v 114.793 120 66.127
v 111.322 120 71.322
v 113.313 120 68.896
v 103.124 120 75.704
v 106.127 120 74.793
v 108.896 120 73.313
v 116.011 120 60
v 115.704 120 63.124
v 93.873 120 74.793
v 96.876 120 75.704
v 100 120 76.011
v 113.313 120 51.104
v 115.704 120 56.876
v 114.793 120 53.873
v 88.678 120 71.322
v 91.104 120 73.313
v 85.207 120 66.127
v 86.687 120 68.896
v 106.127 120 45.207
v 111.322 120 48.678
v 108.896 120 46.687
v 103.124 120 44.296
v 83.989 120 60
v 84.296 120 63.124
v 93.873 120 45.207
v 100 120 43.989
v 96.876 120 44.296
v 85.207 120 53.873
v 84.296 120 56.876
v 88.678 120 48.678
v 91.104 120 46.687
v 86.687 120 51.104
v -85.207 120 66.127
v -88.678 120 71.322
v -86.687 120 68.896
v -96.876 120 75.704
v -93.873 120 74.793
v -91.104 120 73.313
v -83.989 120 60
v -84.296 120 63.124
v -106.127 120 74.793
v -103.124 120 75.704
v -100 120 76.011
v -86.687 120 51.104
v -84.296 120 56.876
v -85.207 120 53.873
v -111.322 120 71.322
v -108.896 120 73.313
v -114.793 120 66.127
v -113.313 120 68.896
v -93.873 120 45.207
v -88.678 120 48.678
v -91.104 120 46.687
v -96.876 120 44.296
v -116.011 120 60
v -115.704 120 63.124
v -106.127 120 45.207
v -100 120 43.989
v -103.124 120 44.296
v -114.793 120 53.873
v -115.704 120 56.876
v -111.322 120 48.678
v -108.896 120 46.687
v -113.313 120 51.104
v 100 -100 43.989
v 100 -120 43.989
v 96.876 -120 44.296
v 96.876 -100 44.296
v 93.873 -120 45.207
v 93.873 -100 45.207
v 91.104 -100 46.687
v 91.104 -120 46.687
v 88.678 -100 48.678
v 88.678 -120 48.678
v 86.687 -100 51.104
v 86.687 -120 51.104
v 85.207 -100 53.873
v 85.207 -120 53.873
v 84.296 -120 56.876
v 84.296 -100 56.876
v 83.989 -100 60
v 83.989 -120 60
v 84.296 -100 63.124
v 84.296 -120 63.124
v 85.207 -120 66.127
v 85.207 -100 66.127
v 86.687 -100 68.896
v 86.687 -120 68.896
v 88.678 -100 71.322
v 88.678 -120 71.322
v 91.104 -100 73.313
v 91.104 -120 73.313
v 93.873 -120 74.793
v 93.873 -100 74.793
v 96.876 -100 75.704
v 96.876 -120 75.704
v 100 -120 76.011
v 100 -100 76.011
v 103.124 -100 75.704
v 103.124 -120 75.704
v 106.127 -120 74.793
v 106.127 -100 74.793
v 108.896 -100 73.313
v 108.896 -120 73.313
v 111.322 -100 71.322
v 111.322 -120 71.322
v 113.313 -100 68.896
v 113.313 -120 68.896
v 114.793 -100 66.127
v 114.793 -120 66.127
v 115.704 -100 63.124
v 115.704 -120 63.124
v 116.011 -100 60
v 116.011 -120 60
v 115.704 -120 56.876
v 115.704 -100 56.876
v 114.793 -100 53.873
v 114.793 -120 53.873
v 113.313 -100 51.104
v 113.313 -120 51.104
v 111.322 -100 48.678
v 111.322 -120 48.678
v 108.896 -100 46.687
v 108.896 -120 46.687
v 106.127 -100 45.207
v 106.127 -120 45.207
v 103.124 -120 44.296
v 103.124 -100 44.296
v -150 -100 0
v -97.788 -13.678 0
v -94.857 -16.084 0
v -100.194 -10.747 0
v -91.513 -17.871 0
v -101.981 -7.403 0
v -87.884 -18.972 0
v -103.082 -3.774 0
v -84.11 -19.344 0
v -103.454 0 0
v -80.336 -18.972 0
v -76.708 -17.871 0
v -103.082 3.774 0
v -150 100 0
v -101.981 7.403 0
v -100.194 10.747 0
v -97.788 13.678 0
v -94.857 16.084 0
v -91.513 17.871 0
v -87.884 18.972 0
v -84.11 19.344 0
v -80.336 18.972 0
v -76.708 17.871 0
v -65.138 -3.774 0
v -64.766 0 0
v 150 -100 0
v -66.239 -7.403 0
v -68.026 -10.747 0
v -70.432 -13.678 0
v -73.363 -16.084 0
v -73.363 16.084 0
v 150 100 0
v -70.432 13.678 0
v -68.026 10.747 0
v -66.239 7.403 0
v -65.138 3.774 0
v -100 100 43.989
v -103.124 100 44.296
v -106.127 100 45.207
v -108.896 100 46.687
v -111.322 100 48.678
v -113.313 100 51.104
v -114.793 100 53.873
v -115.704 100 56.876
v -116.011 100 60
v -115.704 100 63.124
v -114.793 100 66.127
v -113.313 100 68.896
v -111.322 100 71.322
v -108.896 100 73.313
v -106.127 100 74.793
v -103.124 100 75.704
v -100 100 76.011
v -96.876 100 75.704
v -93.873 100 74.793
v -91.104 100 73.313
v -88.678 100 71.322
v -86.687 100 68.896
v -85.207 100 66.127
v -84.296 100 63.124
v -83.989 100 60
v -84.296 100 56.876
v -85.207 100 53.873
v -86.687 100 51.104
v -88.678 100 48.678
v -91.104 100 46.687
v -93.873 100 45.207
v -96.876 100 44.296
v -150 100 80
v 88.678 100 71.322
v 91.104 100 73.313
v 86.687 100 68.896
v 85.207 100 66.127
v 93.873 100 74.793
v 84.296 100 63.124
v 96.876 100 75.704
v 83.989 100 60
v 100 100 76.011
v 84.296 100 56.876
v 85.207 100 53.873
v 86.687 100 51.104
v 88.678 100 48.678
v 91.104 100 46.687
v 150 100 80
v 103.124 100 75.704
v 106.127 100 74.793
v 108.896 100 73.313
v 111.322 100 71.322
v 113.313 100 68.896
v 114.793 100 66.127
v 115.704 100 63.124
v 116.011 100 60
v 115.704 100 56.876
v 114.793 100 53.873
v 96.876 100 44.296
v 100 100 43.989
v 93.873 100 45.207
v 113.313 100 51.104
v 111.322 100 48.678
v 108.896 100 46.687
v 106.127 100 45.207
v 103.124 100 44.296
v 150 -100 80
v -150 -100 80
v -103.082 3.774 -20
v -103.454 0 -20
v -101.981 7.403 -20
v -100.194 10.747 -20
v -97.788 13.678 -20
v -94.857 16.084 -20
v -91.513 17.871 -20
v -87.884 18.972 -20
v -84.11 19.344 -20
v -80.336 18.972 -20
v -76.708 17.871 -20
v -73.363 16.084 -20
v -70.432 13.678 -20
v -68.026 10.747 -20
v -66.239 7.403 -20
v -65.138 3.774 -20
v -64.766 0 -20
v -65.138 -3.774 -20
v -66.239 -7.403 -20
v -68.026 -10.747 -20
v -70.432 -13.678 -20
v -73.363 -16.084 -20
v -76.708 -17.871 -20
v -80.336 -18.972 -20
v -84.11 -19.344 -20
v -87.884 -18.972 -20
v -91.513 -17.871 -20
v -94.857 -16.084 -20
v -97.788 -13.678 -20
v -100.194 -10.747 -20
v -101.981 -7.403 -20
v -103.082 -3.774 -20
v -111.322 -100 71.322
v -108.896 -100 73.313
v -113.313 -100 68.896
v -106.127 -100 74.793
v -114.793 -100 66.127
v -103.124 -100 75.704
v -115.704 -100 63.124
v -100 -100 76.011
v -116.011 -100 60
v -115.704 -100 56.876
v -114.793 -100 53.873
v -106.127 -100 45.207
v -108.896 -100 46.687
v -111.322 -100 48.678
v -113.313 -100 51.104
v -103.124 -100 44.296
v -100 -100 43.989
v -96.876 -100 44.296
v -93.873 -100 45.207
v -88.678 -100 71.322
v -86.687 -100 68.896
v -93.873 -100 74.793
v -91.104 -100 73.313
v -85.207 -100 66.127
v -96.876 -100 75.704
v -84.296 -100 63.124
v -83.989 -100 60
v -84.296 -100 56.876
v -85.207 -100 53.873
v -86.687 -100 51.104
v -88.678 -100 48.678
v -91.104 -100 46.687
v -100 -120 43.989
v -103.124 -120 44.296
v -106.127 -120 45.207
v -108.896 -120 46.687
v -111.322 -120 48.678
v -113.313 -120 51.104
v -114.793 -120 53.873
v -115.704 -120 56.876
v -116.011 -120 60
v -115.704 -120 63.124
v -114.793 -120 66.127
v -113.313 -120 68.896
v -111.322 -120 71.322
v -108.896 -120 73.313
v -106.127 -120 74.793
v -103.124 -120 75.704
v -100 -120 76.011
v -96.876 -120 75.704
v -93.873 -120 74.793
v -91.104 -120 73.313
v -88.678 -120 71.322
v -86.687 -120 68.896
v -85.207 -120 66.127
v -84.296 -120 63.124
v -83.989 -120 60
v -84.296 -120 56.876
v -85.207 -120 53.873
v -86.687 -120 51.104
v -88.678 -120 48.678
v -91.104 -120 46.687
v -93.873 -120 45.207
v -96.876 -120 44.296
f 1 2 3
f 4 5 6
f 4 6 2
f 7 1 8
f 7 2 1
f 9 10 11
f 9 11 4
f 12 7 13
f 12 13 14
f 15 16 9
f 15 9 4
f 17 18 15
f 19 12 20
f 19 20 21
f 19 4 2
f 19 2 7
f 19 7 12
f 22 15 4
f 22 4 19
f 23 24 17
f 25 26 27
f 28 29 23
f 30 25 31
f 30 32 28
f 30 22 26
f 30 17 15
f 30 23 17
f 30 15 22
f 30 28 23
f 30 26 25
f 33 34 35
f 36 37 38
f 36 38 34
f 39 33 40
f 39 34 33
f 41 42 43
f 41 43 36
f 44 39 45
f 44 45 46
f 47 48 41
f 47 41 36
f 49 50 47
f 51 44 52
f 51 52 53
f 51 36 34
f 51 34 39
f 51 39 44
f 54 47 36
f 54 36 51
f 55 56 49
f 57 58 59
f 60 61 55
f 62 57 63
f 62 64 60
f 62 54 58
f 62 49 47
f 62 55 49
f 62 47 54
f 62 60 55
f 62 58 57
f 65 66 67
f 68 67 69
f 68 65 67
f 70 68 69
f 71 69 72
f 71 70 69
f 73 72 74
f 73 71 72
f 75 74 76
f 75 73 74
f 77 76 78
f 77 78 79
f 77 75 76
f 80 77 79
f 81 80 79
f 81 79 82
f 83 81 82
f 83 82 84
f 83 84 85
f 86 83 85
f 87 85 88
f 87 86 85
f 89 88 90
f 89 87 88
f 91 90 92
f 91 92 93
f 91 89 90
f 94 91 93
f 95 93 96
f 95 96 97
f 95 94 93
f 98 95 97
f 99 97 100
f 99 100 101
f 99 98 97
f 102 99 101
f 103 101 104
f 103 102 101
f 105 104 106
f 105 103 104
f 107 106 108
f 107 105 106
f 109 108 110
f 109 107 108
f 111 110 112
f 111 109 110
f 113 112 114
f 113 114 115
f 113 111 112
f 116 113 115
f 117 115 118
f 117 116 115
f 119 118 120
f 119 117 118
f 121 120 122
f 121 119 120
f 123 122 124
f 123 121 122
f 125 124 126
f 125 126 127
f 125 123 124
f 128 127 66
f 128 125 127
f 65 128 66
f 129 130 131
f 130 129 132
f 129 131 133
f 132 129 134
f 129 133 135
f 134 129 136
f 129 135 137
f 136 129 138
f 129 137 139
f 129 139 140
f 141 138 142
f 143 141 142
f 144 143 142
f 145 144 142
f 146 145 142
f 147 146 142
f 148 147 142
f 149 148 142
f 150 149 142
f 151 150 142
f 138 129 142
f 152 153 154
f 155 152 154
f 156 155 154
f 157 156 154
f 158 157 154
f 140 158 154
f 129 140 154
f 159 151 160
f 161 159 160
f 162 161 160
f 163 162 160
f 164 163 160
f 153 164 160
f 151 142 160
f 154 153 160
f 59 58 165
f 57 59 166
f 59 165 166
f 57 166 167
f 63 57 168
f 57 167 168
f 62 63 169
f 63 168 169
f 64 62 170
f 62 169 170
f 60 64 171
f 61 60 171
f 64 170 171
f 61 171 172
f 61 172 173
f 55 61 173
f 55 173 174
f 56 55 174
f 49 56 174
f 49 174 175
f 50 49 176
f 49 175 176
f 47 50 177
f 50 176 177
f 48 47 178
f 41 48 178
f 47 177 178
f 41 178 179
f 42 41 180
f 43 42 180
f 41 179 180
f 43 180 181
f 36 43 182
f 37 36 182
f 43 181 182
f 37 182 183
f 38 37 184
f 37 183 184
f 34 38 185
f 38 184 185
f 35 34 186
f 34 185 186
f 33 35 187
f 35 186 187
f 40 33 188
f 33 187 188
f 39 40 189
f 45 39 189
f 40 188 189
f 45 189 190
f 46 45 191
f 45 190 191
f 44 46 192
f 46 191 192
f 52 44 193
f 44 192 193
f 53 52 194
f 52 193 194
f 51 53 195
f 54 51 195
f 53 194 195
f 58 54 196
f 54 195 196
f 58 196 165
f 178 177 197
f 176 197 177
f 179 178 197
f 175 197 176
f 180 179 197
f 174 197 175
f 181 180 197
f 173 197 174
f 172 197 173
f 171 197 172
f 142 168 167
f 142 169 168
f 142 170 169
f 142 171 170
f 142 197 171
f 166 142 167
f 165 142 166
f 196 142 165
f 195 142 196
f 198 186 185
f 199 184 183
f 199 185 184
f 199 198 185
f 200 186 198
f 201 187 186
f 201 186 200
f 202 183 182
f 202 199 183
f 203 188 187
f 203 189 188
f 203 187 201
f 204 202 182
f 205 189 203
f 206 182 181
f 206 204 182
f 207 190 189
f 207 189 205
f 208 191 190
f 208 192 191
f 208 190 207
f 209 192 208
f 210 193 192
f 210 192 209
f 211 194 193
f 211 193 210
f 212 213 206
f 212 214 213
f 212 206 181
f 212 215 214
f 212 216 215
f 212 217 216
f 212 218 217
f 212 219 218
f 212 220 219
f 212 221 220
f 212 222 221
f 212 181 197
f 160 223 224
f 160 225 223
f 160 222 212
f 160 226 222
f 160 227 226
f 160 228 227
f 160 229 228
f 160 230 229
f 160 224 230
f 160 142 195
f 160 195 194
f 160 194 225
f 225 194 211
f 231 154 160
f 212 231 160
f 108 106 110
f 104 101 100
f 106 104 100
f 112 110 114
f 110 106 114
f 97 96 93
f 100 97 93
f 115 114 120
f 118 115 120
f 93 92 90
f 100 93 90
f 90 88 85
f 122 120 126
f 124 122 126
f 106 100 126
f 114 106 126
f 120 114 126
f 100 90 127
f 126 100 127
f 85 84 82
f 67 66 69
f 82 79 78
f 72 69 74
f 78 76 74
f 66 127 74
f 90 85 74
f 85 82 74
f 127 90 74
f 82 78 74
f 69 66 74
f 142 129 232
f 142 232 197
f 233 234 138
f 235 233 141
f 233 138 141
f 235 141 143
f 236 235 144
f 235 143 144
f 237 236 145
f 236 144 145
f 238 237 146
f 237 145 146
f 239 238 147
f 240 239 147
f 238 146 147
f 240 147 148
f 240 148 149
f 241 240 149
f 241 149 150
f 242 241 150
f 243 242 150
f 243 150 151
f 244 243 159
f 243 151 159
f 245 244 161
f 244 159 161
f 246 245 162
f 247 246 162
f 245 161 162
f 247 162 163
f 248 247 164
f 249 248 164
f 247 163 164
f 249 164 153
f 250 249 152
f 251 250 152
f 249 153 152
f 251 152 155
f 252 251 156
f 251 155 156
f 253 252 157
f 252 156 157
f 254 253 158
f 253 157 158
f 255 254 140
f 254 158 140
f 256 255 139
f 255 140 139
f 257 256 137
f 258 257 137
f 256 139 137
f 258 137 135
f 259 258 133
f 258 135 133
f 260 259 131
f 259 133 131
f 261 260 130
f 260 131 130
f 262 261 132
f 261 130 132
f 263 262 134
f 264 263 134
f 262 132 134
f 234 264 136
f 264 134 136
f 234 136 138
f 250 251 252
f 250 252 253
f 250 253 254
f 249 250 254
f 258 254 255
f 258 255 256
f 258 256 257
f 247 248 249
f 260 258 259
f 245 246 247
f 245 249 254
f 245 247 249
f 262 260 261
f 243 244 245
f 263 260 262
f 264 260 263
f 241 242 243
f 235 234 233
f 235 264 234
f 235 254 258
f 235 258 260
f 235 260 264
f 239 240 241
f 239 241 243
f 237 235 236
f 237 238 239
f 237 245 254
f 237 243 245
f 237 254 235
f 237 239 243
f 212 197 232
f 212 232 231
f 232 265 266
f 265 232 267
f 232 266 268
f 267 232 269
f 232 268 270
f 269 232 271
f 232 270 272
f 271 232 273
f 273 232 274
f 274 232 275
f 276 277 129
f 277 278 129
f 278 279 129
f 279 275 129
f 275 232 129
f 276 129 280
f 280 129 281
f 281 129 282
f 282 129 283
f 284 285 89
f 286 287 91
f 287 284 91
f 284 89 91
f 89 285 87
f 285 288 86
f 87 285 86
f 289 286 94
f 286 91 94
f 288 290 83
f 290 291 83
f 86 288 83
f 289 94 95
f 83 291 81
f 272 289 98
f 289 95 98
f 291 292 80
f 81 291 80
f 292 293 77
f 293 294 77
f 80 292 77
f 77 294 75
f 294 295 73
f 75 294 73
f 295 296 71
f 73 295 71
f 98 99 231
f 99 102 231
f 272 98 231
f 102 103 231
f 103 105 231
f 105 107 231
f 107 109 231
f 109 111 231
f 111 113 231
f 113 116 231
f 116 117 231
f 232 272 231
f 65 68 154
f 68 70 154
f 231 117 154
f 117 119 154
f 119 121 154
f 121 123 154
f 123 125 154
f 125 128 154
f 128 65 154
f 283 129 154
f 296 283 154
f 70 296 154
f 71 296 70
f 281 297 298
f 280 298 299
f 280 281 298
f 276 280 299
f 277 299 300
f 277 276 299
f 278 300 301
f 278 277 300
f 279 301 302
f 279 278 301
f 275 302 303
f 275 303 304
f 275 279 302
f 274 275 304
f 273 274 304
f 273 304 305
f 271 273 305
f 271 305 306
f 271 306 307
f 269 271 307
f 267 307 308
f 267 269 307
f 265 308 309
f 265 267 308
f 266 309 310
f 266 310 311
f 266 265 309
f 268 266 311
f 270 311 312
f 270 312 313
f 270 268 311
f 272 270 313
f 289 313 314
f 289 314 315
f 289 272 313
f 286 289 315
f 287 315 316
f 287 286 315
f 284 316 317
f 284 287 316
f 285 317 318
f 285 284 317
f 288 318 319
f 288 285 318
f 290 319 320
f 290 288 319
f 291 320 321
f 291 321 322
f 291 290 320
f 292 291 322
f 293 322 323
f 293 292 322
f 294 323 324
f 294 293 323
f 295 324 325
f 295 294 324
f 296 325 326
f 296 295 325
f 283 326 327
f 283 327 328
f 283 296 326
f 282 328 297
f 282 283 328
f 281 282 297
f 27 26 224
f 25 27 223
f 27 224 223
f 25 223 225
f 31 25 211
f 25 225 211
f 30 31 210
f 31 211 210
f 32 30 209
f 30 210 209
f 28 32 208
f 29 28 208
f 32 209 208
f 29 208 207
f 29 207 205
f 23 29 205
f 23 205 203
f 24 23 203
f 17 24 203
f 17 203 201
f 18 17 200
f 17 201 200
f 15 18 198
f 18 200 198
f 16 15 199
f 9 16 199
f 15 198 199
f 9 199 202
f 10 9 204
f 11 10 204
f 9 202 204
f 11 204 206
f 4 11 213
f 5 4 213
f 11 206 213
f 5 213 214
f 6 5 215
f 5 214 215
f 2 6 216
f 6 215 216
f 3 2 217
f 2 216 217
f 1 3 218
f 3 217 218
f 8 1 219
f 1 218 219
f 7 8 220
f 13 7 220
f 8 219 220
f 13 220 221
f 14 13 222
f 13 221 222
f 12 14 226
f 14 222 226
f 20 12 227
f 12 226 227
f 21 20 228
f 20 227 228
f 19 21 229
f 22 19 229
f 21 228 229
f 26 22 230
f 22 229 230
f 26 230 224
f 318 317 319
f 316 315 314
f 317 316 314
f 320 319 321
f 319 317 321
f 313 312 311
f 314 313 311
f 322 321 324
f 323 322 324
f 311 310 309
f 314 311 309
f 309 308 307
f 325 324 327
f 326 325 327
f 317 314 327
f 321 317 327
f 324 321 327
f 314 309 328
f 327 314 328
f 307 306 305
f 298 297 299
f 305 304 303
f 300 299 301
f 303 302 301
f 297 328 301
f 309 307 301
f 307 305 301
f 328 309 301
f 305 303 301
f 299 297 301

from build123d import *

# Parameters (mm, degrees)
SKETCH_1_W      = 300
SKETCH_1_H      = 200
EXTRUDE_1_DEPTH = 80
SKETCH_2_R      = 16.011496702
EXTRUDE_2_DEPTH = 20
SKETCH_3_R      = 19.343729763
EXTRUDE_3_DEPTH = 20


with BuildPart() as part:
    # 草图1 → 凸台-拉伸1 (new body)
    with BuildSketch(Plane.XY):
        Rectangle(SKETCH_1_W, SKETCH_1_H)
    extrude(amount=EXTRUDE_1_DEPTH)

    # 草图2 → 凸台-拉伸2 (add)
    with BuildSketch(Plane(origin=(0, 100, 0), x_dir=(1, 0, 0), z_dir=(0, 1, 0))):
        with Locations(Location((-100, -60, 0), (0, 0, 90))):
            Circle(SKETCH_2_R)
        with Locations(Location((100, -60, 0), (0, 0, 90))):
            Circle(SKETCH_2_R)
    extrude_2 = extrude(amount=EXTRUDE_2_DEPTH)

    # 镜向1: 凸台-拉伸2 across plane
    add(extrude_2.mirror(Plane.ZX))

    # 草图3 → 凸台-拉伸3 (add)
    with BuildSketch(Plane(origin=(0, 0, 0), x_dir=(-1, 0, 0), z_dir=(0, 0, -1))):
        with Locations((84.11011185, 0)):
            Circle(SKETCH_3_R)
    extrude(amount=EXTRUDE_3_DEPTH)


solid = part.part
